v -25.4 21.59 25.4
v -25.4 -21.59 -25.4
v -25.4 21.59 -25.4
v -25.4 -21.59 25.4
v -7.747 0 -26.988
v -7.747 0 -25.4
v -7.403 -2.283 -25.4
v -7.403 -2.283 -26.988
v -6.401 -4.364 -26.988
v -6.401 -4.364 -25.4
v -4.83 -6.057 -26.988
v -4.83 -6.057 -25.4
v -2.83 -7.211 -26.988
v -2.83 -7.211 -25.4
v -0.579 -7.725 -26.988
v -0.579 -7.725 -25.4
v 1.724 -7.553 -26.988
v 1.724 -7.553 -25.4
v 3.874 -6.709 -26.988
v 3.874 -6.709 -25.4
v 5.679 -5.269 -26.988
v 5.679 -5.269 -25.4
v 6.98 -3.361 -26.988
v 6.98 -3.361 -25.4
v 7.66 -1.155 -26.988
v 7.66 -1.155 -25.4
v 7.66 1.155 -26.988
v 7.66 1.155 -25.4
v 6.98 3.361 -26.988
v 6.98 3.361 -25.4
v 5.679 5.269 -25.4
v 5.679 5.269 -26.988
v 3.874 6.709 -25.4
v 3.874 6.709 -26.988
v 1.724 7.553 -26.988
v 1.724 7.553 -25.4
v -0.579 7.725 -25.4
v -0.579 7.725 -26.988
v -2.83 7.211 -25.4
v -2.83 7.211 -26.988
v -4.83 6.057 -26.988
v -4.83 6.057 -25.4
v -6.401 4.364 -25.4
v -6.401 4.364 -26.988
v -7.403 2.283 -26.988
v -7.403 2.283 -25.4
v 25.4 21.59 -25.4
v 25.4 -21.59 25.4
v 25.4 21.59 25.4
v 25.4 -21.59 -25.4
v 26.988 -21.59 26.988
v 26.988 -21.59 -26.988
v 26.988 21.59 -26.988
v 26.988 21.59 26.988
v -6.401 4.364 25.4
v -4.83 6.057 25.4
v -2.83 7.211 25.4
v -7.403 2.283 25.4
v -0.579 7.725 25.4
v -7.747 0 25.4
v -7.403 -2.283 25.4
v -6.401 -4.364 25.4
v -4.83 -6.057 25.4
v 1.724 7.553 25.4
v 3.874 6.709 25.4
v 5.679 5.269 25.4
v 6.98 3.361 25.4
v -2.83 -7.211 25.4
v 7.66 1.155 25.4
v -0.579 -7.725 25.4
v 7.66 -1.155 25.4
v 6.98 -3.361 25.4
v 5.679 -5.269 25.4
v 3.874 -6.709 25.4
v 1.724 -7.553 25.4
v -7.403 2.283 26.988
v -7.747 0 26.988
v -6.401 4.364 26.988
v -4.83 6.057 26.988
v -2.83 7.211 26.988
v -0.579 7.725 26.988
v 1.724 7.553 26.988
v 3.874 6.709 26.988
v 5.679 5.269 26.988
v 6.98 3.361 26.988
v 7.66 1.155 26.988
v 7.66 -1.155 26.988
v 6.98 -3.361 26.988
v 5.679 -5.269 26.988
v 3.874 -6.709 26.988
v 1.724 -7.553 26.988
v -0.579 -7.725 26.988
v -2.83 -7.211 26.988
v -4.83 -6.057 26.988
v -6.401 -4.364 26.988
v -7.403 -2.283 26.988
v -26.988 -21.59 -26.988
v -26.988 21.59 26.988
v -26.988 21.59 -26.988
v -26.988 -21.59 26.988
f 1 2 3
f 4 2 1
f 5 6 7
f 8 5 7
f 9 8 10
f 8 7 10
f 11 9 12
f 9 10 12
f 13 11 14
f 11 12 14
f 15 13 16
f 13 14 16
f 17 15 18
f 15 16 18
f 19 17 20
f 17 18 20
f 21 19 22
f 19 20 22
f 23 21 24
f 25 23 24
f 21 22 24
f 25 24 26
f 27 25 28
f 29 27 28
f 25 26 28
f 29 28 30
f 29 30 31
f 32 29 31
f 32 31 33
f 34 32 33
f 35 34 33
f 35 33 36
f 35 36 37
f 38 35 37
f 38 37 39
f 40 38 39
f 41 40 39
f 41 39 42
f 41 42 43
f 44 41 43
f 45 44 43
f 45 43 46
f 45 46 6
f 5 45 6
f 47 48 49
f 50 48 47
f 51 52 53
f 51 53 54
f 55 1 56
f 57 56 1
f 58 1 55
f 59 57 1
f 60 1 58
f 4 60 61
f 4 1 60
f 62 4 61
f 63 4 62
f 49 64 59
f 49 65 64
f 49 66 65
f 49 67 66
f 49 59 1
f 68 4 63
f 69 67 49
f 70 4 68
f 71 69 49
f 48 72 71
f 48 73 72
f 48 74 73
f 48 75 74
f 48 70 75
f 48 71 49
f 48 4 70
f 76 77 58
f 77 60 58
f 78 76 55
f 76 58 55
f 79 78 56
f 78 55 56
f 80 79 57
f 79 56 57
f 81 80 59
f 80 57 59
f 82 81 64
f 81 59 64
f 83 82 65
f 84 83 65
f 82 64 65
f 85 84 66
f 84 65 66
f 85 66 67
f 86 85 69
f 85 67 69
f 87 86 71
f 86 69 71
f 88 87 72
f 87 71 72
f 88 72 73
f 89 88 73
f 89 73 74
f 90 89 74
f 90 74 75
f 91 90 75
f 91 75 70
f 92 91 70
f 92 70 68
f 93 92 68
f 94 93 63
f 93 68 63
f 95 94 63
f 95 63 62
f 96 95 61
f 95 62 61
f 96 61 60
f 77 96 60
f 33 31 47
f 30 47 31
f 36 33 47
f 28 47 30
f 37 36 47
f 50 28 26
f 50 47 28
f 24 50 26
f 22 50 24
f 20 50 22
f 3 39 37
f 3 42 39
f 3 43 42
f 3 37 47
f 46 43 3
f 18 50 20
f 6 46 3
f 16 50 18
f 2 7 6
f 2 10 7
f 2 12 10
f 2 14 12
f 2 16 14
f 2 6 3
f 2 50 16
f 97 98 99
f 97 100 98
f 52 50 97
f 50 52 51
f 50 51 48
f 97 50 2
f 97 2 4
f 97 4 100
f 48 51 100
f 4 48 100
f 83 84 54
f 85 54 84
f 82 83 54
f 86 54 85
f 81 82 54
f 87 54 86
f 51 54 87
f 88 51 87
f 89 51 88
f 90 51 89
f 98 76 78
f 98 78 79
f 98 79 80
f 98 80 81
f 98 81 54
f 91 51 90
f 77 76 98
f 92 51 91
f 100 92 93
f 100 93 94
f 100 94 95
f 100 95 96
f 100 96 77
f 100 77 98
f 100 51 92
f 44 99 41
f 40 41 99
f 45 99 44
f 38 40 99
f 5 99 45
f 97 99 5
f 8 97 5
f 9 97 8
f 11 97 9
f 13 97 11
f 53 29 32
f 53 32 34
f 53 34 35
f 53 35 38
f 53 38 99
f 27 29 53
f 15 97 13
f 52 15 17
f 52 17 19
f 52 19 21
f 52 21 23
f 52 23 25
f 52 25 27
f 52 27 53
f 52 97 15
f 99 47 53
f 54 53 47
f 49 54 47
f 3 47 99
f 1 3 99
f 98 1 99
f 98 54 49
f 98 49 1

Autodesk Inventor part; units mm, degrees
ref_plane "YZ Plane" through (0, 0, 0) normal (1, 0, 0) x (0, 1, 0)
ref_plane "XZ Plane" through (0, 0, 0) normal (0, 1, 0) x (-1, 0, 0)
ref_plane "XY Plane" through (0, 0, 0) normal (0, 0, 1) x (1, 0, 0)
sketch "Sketch1" plane through (0, 0, 0) normal (0, 1, 0) x (-1, 0, 0)
  line L0 (-25.4, -25.4) -> (25.4, -25.4)
  line L1 (25.4, -25.4) -> (25.4, 25.4)
  line L2 (25.4, 25.4) -> (-25.4, 25.4)
  line L3 (-25.4, 25.4) -> (-25.4, -25.4)
  line L4 (-25.4, -25.4) -> (25.4, 25.4) construction
  line L5 (25.4, -25.4) -> (-25.4, 25.4) construction
  line L6 (26.9875, 26.9875) -> (26.9875, -26.9875)
  line L7 (26.9875, -26.9875) -> (-26.9875, -26.9875)
  line L8 (-26.9875, -26.9875) -> (-26.9875, 26.9875)
  line L9 (-26.9875, 26.9875) -> (26.9875, 26.9875)
  point P0 (0, 0)
  dimension "d0" = 50.8
  dimension "d1" = 50.8
  dimension "d2" = -1.5875
extrude "Extrusion1" add sketch "Sketch1" along normal mid plane 43.18
sketch "Sketch2" plane through (-25.4, 21.59, 25.4) normal (0, 0, -1) x (-1, 0, 0)
  circle A0 centre (-25.4, -21.59) radius 7.747
  dimension "d5" = 15.494
extrude "Extrusion2" cut sketch "Sketch2" along normal through all both and the other way through all
properties part number "Container"
